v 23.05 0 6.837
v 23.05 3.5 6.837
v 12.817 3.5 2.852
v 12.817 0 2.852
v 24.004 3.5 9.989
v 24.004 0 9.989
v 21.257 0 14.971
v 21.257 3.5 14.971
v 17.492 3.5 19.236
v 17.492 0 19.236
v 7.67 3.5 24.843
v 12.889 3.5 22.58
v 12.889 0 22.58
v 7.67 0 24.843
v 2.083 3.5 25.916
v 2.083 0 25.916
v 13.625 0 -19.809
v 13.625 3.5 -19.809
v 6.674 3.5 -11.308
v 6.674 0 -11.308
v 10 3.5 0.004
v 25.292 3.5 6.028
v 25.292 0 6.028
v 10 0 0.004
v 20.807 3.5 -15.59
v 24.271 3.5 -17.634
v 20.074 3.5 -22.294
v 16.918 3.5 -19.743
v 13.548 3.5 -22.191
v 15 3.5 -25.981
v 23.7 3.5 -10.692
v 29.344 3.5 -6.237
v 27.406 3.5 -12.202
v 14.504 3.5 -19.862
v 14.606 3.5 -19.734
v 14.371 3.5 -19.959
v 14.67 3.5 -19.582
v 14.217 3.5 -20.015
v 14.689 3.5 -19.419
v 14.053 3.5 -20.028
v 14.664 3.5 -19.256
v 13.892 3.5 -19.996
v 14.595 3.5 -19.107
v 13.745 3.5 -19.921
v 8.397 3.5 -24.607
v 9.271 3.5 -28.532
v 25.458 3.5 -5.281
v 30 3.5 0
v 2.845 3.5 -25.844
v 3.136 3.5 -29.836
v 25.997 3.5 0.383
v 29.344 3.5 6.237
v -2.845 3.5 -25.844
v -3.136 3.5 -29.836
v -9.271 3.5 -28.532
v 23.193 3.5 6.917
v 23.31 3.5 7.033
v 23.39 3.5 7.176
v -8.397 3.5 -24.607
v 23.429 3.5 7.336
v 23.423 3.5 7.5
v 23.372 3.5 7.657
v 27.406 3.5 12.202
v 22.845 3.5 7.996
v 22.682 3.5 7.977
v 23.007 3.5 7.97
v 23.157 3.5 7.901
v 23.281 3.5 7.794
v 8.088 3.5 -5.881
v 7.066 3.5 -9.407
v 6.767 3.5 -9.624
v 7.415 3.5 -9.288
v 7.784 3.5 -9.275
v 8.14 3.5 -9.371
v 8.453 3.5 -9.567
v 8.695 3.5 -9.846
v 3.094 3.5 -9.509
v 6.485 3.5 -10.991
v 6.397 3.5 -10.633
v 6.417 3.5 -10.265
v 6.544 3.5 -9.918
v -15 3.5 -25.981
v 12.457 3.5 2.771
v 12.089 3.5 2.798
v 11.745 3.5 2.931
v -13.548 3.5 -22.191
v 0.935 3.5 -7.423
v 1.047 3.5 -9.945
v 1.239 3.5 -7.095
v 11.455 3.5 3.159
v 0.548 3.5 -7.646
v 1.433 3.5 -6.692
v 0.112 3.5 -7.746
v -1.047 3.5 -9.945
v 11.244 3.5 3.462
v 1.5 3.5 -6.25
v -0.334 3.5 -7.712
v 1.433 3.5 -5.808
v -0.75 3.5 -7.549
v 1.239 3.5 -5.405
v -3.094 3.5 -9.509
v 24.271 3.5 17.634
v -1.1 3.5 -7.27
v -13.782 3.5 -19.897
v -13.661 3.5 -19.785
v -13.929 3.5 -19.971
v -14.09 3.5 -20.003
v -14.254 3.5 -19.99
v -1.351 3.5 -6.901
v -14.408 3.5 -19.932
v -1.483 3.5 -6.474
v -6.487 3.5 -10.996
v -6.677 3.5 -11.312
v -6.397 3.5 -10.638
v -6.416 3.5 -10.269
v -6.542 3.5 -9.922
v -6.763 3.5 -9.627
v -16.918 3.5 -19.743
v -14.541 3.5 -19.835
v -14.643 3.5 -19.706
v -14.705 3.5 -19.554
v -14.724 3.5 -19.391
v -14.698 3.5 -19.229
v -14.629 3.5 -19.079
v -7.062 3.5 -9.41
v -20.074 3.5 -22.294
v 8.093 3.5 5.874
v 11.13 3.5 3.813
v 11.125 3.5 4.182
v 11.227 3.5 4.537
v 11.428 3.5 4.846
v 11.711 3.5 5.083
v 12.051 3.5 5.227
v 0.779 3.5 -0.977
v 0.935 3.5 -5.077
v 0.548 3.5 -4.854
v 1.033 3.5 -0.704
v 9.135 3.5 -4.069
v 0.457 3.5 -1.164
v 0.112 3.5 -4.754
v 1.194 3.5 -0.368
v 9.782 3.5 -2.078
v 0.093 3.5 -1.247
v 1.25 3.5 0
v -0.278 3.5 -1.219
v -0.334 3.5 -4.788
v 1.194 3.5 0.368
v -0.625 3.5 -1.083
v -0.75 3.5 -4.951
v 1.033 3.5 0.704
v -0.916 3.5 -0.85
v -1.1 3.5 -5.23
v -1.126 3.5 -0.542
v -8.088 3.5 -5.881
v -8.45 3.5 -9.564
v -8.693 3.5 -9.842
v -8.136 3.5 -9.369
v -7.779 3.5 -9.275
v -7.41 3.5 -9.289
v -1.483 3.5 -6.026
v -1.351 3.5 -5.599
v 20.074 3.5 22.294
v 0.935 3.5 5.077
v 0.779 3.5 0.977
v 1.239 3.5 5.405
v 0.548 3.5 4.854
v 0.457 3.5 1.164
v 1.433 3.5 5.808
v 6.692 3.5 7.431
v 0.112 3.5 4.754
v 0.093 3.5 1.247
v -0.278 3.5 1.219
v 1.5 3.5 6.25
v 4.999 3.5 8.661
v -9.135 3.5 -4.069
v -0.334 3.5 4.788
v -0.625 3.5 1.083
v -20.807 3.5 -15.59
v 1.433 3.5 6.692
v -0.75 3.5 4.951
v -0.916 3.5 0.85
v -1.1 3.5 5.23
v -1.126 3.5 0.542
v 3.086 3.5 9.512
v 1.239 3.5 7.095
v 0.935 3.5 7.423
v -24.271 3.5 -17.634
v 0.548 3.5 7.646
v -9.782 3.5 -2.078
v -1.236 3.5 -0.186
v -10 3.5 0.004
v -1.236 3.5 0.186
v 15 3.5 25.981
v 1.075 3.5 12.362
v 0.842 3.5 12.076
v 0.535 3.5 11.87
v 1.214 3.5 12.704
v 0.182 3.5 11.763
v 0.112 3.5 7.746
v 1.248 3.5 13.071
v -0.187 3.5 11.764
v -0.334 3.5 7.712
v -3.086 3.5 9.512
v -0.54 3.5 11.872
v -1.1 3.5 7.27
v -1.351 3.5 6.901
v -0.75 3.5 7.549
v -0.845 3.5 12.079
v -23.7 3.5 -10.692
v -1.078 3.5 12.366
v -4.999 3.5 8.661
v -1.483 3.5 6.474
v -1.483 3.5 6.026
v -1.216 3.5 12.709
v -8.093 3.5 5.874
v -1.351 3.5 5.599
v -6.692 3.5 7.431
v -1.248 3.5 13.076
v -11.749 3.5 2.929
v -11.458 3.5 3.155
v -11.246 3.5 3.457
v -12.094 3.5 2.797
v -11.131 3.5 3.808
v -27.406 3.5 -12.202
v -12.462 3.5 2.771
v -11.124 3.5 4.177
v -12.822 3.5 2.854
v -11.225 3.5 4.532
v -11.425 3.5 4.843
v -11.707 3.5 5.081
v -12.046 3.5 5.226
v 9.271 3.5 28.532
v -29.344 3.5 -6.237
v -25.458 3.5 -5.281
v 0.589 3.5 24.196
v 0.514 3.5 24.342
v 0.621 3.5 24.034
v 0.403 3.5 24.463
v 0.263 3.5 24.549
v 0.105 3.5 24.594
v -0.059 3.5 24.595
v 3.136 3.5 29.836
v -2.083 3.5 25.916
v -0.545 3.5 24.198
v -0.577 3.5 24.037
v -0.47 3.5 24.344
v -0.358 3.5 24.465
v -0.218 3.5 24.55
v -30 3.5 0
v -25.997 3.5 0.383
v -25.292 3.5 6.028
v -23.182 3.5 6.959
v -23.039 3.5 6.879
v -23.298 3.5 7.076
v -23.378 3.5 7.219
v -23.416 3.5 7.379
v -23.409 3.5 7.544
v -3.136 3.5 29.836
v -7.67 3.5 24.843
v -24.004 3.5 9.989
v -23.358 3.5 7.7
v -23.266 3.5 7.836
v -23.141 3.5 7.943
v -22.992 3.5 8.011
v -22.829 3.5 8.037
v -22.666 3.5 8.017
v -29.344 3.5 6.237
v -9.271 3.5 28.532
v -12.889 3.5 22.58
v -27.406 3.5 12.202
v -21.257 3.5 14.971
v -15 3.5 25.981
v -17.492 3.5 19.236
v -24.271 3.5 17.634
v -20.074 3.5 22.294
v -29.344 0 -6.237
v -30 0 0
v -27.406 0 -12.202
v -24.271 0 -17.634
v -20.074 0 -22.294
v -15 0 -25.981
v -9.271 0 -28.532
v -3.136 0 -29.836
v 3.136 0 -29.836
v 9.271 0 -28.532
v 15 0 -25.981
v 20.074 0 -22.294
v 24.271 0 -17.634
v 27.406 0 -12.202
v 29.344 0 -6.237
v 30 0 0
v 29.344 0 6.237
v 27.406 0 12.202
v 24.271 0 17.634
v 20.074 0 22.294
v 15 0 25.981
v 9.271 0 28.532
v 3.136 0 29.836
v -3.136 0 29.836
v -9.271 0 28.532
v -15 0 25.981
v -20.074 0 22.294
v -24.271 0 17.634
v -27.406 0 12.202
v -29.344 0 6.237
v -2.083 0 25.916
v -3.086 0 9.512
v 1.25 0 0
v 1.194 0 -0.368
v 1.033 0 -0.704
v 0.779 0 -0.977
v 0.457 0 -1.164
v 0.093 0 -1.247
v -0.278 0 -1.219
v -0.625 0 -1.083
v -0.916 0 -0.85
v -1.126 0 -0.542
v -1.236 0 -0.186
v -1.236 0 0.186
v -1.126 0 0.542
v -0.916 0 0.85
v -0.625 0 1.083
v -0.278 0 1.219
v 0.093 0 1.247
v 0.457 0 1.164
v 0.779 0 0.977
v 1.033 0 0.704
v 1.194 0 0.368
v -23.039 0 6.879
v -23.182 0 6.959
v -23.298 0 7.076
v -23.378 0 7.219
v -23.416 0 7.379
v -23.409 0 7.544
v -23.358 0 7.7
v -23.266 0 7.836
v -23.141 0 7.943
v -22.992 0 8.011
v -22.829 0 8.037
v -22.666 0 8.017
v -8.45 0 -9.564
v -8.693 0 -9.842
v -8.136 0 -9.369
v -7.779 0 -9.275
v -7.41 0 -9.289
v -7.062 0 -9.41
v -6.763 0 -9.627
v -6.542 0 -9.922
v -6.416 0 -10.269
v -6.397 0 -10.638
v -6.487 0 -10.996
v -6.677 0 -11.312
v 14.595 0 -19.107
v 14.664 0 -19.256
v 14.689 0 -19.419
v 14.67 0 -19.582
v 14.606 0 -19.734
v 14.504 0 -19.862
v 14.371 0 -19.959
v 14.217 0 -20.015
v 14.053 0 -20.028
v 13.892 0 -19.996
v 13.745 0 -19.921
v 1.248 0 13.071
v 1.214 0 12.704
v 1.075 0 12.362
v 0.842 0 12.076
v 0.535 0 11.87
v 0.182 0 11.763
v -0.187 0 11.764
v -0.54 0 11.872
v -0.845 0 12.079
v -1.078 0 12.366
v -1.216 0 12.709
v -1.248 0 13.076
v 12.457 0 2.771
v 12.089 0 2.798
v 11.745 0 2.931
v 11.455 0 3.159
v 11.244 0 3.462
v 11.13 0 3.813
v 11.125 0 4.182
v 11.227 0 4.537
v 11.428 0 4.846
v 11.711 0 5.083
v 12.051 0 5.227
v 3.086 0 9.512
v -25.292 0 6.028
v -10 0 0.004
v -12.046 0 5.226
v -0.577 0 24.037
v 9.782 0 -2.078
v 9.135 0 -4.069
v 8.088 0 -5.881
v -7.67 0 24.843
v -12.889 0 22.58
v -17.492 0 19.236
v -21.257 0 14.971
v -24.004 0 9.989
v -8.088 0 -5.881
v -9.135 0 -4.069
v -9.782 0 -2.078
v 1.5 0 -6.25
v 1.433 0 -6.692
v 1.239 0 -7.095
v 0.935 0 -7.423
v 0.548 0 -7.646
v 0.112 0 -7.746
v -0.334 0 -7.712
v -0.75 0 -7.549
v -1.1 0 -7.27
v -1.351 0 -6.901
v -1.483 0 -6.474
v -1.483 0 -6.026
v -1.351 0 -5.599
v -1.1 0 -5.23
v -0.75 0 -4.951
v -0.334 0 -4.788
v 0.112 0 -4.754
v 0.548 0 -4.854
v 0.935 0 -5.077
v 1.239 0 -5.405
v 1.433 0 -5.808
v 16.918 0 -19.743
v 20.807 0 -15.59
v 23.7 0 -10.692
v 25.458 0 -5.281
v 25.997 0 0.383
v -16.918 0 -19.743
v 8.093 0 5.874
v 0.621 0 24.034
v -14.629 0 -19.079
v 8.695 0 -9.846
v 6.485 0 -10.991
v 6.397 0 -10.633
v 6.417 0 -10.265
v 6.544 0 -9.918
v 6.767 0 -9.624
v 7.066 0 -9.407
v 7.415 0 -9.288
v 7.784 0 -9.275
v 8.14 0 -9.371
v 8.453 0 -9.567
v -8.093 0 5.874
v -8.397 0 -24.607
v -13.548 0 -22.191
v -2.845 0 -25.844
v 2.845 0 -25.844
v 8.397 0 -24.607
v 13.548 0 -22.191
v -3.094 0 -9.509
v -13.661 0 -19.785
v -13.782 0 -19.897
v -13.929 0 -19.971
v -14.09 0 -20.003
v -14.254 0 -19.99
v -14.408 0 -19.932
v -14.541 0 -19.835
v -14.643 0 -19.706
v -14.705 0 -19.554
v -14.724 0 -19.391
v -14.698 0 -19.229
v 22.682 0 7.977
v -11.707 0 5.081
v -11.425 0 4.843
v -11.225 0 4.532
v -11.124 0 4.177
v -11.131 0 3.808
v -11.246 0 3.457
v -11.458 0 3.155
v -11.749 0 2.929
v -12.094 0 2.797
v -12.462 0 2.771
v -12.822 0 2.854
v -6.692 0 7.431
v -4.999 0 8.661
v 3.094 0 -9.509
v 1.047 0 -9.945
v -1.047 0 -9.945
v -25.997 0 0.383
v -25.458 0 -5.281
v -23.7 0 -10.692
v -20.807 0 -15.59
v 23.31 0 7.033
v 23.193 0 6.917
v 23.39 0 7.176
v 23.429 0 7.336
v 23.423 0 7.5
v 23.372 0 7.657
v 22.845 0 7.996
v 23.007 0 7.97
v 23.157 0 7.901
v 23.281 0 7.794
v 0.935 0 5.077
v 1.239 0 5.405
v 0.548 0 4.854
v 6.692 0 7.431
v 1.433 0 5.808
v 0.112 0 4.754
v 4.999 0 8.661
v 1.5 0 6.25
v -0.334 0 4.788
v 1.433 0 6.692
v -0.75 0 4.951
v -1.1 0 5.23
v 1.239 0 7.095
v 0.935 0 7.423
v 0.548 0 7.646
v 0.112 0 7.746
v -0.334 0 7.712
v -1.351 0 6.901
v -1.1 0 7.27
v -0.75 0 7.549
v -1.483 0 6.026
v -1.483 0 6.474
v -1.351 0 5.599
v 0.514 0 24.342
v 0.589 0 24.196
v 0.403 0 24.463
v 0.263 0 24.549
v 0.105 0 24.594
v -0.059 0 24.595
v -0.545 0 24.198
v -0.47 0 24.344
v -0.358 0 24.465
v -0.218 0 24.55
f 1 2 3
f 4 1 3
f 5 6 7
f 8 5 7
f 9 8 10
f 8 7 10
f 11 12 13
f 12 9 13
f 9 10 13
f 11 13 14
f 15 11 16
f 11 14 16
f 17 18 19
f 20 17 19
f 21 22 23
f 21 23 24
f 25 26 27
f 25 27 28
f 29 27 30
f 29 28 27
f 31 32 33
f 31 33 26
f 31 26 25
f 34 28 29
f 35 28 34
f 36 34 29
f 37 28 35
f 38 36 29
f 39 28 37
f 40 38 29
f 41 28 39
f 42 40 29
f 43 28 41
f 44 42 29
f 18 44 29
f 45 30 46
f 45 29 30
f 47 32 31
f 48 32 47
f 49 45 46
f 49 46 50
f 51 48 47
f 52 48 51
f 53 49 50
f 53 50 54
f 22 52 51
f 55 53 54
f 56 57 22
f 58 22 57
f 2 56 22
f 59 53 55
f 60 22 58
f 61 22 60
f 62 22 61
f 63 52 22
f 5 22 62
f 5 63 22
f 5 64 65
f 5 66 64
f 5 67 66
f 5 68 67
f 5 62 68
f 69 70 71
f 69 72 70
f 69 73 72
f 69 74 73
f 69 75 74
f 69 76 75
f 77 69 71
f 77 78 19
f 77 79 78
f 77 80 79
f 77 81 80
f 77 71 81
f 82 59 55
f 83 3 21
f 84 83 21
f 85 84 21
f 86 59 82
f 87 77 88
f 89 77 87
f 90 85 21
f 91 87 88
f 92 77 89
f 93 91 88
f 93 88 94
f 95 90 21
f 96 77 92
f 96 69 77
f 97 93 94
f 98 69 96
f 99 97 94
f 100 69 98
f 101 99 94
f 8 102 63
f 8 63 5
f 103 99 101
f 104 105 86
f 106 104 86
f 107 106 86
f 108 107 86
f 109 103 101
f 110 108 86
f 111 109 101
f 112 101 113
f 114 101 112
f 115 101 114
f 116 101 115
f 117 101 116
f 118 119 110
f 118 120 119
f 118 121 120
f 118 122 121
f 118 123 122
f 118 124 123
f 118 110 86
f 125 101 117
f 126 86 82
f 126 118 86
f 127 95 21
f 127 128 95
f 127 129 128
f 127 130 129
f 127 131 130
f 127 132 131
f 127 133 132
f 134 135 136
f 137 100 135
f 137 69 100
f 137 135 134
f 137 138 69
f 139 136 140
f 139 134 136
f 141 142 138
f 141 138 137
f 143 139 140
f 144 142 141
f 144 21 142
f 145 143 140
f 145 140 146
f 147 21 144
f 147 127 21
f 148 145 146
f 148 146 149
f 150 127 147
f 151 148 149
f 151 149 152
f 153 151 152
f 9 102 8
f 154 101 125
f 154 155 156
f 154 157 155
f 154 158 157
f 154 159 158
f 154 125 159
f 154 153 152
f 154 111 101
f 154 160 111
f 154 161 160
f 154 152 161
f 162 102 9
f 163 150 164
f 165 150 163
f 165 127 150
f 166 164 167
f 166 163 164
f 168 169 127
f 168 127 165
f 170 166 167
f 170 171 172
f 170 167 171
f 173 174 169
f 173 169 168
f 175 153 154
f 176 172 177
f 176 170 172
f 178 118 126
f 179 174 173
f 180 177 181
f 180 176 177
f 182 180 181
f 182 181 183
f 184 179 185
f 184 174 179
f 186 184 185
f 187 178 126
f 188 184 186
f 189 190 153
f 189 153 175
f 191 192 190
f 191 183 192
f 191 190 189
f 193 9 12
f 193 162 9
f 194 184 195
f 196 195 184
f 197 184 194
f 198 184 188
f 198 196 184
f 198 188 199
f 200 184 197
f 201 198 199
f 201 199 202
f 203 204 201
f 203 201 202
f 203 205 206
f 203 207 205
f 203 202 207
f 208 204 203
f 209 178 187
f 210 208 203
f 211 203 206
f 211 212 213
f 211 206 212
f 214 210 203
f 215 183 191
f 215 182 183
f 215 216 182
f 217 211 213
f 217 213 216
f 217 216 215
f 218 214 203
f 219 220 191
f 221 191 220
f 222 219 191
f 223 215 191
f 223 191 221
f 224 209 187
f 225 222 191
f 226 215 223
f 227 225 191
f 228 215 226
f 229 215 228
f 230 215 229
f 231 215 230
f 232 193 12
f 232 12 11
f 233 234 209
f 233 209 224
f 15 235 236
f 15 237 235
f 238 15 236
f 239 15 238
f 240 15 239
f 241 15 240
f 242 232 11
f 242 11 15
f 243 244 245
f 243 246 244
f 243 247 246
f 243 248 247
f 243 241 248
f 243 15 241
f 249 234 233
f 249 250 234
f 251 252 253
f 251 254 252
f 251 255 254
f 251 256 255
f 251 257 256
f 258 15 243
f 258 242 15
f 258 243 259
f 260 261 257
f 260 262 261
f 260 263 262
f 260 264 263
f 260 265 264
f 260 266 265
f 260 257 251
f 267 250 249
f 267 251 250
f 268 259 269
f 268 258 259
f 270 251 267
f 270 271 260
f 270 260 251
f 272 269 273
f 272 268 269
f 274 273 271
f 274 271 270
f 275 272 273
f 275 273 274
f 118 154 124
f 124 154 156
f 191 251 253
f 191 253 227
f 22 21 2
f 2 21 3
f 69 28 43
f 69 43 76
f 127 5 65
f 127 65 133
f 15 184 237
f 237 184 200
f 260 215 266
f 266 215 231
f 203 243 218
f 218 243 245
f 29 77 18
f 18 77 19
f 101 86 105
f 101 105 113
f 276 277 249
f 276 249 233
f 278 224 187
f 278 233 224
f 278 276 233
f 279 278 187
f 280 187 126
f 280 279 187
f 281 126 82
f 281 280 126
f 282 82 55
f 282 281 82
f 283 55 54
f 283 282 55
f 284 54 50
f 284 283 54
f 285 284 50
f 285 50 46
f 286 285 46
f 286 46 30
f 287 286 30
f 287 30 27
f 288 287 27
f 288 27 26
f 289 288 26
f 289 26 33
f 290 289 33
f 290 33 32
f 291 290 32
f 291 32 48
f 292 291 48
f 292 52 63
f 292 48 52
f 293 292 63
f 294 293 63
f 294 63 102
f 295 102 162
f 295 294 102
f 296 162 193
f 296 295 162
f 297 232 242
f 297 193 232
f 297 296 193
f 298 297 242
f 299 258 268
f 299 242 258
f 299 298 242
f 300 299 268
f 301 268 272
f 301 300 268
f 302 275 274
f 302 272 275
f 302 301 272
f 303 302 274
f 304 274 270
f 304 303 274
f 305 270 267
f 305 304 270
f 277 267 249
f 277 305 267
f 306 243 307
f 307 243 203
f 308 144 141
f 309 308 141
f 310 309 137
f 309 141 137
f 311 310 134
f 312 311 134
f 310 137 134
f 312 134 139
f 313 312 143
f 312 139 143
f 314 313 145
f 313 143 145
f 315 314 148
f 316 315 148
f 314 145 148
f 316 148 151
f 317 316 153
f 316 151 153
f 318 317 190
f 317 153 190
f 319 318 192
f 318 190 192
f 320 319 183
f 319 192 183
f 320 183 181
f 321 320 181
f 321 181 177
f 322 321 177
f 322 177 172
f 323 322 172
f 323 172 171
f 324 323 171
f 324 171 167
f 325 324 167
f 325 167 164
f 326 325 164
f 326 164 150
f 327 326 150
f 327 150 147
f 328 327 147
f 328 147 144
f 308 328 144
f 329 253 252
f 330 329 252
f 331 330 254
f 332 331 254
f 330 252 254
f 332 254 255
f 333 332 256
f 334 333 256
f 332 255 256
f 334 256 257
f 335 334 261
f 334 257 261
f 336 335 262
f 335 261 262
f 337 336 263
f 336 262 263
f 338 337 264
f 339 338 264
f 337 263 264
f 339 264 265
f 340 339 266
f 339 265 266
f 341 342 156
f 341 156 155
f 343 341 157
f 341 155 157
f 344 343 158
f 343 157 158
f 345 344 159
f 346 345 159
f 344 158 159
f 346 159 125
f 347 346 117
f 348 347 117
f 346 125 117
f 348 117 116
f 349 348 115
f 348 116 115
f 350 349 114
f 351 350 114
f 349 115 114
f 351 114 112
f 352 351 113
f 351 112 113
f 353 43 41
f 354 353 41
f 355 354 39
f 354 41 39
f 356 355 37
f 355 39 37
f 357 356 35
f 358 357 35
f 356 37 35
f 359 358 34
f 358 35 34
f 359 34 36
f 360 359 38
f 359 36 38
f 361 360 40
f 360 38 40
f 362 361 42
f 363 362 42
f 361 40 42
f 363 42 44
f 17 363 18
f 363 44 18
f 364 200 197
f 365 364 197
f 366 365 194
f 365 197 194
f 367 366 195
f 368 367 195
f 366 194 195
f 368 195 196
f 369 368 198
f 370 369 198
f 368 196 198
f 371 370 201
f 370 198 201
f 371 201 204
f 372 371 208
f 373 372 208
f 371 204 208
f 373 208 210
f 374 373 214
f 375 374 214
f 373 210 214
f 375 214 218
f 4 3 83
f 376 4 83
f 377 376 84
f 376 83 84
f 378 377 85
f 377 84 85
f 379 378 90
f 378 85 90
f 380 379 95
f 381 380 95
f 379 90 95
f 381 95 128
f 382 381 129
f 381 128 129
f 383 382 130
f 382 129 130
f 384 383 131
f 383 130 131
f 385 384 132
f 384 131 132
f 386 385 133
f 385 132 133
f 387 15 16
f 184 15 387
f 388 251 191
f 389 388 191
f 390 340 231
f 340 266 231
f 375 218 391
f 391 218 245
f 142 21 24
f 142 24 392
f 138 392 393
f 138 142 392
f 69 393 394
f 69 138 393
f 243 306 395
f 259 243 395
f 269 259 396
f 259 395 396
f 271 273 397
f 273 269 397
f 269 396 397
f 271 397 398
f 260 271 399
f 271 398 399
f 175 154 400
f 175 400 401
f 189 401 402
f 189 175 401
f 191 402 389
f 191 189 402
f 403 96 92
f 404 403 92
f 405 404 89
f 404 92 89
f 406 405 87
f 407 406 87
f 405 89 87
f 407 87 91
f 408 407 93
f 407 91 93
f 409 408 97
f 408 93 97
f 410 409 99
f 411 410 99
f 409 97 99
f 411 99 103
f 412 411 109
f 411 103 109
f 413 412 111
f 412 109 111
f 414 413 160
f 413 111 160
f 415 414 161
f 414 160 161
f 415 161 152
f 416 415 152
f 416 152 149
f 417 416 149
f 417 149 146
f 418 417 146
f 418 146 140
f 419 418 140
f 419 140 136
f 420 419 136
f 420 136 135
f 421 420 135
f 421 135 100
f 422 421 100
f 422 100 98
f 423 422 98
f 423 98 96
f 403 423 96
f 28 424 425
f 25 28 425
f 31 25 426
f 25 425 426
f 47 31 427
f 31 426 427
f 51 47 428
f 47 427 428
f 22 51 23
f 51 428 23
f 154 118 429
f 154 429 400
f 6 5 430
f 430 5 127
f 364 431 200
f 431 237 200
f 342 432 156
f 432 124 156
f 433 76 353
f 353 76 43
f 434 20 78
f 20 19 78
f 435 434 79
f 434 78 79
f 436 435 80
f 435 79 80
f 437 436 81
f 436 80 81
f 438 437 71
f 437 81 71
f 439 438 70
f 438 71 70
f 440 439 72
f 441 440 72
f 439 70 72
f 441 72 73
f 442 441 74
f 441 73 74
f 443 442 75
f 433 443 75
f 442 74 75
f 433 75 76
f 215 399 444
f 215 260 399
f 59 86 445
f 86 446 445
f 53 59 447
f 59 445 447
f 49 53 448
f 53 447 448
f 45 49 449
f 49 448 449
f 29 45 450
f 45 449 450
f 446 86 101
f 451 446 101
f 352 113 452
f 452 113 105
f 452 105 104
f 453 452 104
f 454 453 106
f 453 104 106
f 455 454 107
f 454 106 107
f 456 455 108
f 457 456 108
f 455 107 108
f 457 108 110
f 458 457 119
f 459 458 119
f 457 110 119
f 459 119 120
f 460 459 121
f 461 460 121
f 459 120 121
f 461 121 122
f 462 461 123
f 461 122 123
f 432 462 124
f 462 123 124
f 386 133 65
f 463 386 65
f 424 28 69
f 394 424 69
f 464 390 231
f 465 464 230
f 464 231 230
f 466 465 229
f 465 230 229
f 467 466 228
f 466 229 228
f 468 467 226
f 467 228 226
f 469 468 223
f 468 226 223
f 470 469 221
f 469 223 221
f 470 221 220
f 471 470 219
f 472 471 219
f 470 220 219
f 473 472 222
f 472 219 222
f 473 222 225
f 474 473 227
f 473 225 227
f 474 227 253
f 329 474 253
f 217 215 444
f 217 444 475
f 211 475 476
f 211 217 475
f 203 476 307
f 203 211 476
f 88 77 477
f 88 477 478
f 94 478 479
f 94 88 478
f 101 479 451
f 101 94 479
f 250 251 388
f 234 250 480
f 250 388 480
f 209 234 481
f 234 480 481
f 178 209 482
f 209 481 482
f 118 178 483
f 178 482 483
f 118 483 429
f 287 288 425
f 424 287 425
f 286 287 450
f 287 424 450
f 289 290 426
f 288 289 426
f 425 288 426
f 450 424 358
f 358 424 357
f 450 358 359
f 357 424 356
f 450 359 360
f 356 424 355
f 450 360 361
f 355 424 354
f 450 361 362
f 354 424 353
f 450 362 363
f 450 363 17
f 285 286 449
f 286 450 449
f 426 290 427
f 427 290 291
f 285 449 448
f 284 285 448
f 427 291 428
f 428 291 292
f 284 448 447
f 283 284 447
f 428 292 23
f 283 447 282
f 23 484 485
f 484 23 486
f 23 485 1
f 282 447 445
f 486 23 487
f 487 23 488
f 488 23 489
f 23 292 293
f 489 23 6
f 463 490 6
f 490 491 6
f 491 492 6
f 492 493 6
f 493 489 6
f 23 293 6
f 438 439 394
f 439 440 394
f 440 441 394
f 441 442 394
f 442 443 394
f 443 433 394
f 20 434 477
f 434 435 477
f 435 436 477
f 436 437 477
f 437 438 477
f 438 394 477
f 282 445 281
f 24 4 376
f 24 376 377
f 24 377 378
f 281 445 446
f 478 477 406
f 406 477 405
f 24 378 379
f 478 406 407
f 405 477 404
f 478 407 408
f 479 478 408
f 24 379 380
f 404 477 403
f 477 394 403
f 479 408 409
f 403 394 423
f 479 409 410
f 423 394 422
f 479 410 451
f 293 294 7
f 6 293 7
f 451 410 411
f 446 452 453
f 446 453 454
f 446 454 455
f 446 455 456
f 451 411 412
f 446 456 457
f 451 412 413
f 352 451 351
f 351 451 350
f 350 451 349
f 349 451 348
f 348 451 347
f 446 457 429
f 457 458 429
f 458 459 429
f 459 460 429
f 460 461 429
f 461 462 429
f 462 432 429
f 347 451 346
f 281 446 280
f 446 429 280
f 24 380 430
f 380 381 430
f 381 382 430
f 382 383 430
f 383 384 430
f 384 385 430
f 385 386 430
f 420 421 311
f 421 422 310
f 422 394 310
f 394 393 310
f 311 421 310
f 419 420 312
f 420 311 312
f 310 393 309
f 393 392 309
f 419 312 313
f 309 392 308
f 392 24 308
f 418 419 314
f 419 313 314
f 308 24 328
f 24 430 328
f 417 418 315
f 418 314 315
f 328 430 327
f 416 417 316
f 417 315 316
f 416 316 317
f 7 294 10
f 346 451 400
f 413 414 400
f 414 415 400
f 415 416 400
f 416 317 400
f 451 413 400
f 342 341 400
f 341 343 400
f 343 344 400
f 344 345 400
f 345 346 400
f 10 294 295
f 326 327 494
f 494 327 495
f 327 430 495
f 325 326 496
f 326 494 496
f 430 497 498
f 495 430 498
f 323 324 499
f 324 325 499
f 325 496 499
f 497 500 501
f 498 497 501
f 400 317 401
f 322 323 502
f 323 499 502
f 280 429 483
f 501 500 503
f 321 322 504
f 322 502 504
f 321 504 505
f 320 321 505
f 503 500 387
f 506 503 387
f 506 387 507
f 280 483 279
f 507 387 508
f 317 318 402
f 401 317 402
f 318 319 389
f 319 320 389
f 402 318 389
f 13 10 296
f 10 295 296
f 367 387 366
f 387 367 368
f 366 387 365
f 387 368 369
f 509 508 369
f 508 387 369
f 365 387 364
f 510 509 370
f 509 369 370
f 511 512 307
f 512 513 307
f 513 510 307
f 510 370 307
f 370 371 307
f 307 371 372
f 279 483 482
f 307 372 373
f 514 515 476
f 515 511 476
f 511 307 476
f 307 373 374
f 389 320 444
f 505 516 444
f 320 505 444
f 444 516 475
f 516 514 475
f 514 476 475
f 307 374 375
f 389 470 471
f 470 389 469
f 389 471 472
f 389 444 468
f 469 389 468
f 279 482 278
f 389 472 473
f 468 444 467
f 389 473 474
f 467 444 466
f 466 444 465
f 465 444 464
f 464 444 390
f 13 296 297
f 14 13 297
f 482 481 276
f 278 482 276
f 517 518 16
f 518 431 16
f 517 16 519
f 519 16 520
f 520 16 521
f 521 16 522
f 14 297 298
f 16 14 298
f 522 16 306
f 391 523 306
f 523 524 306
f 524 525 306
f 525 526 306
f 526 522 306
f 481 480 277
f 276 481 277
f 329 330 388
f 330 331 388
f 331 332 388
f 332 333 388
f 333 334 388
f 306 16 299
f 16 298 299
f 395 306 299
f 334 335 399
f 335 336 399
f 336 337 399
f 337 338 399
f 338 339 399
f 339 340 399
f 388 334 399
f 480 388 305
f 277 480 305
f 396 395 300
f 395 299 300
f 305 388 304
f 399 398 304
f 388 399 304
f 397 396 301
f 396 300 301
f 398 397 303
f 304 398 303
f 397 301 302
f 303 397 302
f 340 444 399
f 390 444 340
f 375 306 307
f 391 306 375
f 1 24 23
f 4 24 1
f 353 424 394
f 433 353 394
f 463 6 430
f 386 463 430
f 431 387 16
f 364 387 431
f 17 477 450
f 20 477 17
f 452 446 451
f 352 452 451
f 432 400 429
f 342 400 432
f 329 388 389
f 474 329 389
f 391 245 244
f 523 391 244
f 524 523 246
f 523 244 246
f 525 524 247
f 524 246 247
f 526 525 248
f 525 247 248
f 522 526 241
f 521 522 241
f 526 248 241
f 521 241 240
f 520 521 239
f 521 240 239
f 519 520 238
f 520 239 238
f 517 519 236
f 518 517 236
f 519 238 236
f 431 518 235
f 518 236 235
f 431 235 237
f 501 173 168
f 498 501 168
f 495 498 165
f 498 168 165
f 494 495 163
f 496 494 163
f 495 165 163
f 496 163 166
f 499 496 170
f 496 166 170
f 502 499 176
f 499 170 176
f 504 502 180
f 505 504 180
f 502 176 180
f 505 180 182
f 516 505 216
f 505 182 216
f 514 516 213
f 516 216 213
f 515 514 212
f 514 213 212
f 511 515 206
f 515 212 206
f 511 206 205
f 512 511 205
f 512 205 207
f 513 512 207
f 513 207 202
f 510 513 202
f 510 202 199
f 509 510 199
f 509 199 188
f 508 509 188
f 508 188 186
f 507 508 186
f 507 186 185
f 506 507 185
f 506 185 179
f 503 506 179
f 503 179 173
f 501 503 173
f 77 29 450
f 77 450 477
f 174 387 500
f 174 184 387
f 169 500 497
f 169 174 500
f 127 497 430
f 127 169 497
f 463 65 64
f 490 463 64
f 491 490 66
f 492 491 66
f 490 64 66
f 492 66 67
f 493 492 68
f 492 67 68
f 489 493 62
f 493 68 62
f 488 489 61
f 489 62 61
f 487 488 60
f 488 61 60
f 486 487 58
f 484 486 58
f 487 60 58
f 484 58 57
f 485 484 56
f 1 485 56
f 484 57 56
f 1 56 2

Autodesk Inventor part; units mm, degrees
ref_plane "YZ Plane" through (0, 0, 0) normal (1, 0, 0) x (0, 1, 0)
ref_plane "XZ Plane" through (0, 0, 0) normal (0, 1, 0) x (-1, 0, 0)
ref_plane "XY Plane" through (0, 0, 0) normal (0, 0, 1) x (1, 0, 0)
sketch "Sketch1" plane through (0, 0, 0) normal (0, 1, 0) x (-1, 0, 0)
  circle A0 centre (0, 0) radius 30
  circle A1 centre (0, 0) radius 26
  dimension "d0" = 60
  dimension "d1" = 52
extrude "Extrusion1" add sketch "Sketch1" along normal blind 3.5
sketch "Sketch2" plane through (0, 3.5, 0) normal (0, 1, 0) x (1, 0, 0)
  circle A0 centre (0, 0) radius 1.25
  line L0 (0, -27.5) -> (0, 0) construction
  circle A1 centre (0, 0) radius 60 construction
  line L1 (-1.9903, -27.4279) -> (-3.0861, -9.5119)
  line L2 (1.9903, -27.4279) -> (3.0861, -9.5119)
  arc A2 (-0.5773, -24.0366) -> (0.6206, -24.0343) centre (0.0216, -24) ccw
  arc A3 (1.248, -13.0714) -> (-1.2477, -13.0763) centre (0, -13) ccw
  line L3 (-1.2477, -13.0763) -> (-0.5773, -24.0366)
  line L4 (0.6206, -24.0343) -> (1.248, -13.0714)
  line L5 (-2.2, -24) -> (2.2, -24) construction
  line L6 (25.4704, -10.3686) -> (8.0927, -5.8744)
  line L7 (26.7005, -6.5828) -> (10, -0.0042)
  line L8 (23.0497, -6.8368) -> (12.8173, -2.8524)
  arc A4 (12.8173, -2.8524) -> (12.0508, -5.2274) centre (12.3637, -4.0172) ccw
  line L9 (12.0508, -5.2274) -> (22.6818, -7.9768)
  arc A5 (22.6818, -7.9768) -> (23.0497, -6.8368) centre (22.832, -7.3959) ccw
  line L10 (17.7319, 21.0197) -> (8.0877, 5.8813)
  line L11 (14.5115, 23.3595) -> (3.0942, 9.5093)
  line L12 (13.6249, 19.8089) -> (6.6736, 11.3085)
  arc A6 (6.6736, 11.3085) -> (8.6954, 9.8456) centre (7.6412, 10.5172) ccw
  line L13 (8.6954, 9.8456) -> (14.5954, 19.1067)
  arc A7 (14.5954, 19.1067) -> (13.6249, 19.8089) centre (14.0894, 19.4291) ccw
  line L14 (-14.5115, 23.3595) -> (-3.0942, 9.5093)
  line L15 (-17.7319, 21.0197) -> (-8.0877, 5.8813)
  line L16 (-14.6291, 19.0794) -> (-8.6928, 9.8415)
  arc A8 (-8.6928, 9.8415) -> (-6.6767, 11.3123) centre (-7.6412, 10.5172) ccw
  line L17 (-6.6767, 11.3123) -> (-13.6613, 19.7854)
  arc A9 (-13.6613, 19.7854) -> (-14.6291, 19.0794) centre (-14.1243, 19.4037) ccw
  line L18 (-26.7005, -6.5828) -> (-10, -0.0042)
  line L19 (-25.4704, -10.3686) -> (-8.0927, -5.8744)
  line L20 (-22.6662, -8.0172) -> (-12.046, -5.2262)
  arc A10 (-12.046, -5.2262) -> (-12.8219, -2.8542) centre (-12.3637, -4.0172) ccw
  line L21 (-12.8219, -2.8542) -> (-23.0386, -6.8787)
  arc A11 (-23.0386, -6.8787) -> (-22.6662, -8.0172) centre (-22.8187, -7.4369) ccw
  arc A12 (-1.9903, -27.4279) -> (1.9903, -27.4279) centre (0, 0) ccw
  arc A13 (25.4704, -10.3686) -> (26.7005, -6.5828) centre (0, 0) ccw
  arc A14 (17.7319, 21.0197) -> (14.5115, 23.3595) centre (0, 0) ccw
  arc A15 (-14.5115, 23.3595) -> (-17.7319, 21.0197) centre (0, 0) ccw
  arc A16 (-26.7005, -6.5828) -> (-25.4704, -10.3686) centre (0, 0) ccw
  arc A17 (3.0861, -9.5119) -> (8.0927, -5.8744) centre (0, 0) ccw
  arc A18 (10, -0.0042) -> (8.0877, 5.8813) centre (0, 0) ccw
  arc A19 (3.0942, 9.5093) -> (-3.0942, 9.5093) centre (0, 0) ccw
  arc A20 (-8.0877, 5.8813) -> (-10, -0.0042) centre (0, 0) ccw
  arc A21 (-8.0927, -5.8744) -> (-3.0861, -9.5119) centre (0, 0) ccw
  circle A22 centre (0, 0) radius 6.25 construction
  circle A23 centre (0, 6.25) radius 1.5
  circle A24 centre (0, -6.25) radius 1.5
  point P0 (22.1455, -9.5087)
  point P1 (23.5052, -5.3241)
  point P2 (15.8867, 18.1233)
  point P3 (12.327, 20.7095)
  point P4 (-12.327, 20.7095)
  point P5 (-15.8867, 18.1233)
  point P6 (-23.5052, -5.3241)
  point P7 (-22.1455, -9.5087)
  dimension "d11" = 2.5
  dimension "d13" = 120
  dimension "d15" = 3.5
  dimension "d17" = 0.6
  dimension "d18" = 2.5
  dimension "d19" = 24
  dimension "d20" = 13
  dimension "d21" = 0.225
  dimension "d22" = 4.4
  dimension "d25" = 360
  dimension "d27" = 10
  dimension "d28" = 27.5
  dimension "d29" = 12.5
  dimension "d30" = 3
extrude "Extrusion2" add sketch "Sketch2" against normal up to surface (3.5 mm away)
properties part number "wheel"
